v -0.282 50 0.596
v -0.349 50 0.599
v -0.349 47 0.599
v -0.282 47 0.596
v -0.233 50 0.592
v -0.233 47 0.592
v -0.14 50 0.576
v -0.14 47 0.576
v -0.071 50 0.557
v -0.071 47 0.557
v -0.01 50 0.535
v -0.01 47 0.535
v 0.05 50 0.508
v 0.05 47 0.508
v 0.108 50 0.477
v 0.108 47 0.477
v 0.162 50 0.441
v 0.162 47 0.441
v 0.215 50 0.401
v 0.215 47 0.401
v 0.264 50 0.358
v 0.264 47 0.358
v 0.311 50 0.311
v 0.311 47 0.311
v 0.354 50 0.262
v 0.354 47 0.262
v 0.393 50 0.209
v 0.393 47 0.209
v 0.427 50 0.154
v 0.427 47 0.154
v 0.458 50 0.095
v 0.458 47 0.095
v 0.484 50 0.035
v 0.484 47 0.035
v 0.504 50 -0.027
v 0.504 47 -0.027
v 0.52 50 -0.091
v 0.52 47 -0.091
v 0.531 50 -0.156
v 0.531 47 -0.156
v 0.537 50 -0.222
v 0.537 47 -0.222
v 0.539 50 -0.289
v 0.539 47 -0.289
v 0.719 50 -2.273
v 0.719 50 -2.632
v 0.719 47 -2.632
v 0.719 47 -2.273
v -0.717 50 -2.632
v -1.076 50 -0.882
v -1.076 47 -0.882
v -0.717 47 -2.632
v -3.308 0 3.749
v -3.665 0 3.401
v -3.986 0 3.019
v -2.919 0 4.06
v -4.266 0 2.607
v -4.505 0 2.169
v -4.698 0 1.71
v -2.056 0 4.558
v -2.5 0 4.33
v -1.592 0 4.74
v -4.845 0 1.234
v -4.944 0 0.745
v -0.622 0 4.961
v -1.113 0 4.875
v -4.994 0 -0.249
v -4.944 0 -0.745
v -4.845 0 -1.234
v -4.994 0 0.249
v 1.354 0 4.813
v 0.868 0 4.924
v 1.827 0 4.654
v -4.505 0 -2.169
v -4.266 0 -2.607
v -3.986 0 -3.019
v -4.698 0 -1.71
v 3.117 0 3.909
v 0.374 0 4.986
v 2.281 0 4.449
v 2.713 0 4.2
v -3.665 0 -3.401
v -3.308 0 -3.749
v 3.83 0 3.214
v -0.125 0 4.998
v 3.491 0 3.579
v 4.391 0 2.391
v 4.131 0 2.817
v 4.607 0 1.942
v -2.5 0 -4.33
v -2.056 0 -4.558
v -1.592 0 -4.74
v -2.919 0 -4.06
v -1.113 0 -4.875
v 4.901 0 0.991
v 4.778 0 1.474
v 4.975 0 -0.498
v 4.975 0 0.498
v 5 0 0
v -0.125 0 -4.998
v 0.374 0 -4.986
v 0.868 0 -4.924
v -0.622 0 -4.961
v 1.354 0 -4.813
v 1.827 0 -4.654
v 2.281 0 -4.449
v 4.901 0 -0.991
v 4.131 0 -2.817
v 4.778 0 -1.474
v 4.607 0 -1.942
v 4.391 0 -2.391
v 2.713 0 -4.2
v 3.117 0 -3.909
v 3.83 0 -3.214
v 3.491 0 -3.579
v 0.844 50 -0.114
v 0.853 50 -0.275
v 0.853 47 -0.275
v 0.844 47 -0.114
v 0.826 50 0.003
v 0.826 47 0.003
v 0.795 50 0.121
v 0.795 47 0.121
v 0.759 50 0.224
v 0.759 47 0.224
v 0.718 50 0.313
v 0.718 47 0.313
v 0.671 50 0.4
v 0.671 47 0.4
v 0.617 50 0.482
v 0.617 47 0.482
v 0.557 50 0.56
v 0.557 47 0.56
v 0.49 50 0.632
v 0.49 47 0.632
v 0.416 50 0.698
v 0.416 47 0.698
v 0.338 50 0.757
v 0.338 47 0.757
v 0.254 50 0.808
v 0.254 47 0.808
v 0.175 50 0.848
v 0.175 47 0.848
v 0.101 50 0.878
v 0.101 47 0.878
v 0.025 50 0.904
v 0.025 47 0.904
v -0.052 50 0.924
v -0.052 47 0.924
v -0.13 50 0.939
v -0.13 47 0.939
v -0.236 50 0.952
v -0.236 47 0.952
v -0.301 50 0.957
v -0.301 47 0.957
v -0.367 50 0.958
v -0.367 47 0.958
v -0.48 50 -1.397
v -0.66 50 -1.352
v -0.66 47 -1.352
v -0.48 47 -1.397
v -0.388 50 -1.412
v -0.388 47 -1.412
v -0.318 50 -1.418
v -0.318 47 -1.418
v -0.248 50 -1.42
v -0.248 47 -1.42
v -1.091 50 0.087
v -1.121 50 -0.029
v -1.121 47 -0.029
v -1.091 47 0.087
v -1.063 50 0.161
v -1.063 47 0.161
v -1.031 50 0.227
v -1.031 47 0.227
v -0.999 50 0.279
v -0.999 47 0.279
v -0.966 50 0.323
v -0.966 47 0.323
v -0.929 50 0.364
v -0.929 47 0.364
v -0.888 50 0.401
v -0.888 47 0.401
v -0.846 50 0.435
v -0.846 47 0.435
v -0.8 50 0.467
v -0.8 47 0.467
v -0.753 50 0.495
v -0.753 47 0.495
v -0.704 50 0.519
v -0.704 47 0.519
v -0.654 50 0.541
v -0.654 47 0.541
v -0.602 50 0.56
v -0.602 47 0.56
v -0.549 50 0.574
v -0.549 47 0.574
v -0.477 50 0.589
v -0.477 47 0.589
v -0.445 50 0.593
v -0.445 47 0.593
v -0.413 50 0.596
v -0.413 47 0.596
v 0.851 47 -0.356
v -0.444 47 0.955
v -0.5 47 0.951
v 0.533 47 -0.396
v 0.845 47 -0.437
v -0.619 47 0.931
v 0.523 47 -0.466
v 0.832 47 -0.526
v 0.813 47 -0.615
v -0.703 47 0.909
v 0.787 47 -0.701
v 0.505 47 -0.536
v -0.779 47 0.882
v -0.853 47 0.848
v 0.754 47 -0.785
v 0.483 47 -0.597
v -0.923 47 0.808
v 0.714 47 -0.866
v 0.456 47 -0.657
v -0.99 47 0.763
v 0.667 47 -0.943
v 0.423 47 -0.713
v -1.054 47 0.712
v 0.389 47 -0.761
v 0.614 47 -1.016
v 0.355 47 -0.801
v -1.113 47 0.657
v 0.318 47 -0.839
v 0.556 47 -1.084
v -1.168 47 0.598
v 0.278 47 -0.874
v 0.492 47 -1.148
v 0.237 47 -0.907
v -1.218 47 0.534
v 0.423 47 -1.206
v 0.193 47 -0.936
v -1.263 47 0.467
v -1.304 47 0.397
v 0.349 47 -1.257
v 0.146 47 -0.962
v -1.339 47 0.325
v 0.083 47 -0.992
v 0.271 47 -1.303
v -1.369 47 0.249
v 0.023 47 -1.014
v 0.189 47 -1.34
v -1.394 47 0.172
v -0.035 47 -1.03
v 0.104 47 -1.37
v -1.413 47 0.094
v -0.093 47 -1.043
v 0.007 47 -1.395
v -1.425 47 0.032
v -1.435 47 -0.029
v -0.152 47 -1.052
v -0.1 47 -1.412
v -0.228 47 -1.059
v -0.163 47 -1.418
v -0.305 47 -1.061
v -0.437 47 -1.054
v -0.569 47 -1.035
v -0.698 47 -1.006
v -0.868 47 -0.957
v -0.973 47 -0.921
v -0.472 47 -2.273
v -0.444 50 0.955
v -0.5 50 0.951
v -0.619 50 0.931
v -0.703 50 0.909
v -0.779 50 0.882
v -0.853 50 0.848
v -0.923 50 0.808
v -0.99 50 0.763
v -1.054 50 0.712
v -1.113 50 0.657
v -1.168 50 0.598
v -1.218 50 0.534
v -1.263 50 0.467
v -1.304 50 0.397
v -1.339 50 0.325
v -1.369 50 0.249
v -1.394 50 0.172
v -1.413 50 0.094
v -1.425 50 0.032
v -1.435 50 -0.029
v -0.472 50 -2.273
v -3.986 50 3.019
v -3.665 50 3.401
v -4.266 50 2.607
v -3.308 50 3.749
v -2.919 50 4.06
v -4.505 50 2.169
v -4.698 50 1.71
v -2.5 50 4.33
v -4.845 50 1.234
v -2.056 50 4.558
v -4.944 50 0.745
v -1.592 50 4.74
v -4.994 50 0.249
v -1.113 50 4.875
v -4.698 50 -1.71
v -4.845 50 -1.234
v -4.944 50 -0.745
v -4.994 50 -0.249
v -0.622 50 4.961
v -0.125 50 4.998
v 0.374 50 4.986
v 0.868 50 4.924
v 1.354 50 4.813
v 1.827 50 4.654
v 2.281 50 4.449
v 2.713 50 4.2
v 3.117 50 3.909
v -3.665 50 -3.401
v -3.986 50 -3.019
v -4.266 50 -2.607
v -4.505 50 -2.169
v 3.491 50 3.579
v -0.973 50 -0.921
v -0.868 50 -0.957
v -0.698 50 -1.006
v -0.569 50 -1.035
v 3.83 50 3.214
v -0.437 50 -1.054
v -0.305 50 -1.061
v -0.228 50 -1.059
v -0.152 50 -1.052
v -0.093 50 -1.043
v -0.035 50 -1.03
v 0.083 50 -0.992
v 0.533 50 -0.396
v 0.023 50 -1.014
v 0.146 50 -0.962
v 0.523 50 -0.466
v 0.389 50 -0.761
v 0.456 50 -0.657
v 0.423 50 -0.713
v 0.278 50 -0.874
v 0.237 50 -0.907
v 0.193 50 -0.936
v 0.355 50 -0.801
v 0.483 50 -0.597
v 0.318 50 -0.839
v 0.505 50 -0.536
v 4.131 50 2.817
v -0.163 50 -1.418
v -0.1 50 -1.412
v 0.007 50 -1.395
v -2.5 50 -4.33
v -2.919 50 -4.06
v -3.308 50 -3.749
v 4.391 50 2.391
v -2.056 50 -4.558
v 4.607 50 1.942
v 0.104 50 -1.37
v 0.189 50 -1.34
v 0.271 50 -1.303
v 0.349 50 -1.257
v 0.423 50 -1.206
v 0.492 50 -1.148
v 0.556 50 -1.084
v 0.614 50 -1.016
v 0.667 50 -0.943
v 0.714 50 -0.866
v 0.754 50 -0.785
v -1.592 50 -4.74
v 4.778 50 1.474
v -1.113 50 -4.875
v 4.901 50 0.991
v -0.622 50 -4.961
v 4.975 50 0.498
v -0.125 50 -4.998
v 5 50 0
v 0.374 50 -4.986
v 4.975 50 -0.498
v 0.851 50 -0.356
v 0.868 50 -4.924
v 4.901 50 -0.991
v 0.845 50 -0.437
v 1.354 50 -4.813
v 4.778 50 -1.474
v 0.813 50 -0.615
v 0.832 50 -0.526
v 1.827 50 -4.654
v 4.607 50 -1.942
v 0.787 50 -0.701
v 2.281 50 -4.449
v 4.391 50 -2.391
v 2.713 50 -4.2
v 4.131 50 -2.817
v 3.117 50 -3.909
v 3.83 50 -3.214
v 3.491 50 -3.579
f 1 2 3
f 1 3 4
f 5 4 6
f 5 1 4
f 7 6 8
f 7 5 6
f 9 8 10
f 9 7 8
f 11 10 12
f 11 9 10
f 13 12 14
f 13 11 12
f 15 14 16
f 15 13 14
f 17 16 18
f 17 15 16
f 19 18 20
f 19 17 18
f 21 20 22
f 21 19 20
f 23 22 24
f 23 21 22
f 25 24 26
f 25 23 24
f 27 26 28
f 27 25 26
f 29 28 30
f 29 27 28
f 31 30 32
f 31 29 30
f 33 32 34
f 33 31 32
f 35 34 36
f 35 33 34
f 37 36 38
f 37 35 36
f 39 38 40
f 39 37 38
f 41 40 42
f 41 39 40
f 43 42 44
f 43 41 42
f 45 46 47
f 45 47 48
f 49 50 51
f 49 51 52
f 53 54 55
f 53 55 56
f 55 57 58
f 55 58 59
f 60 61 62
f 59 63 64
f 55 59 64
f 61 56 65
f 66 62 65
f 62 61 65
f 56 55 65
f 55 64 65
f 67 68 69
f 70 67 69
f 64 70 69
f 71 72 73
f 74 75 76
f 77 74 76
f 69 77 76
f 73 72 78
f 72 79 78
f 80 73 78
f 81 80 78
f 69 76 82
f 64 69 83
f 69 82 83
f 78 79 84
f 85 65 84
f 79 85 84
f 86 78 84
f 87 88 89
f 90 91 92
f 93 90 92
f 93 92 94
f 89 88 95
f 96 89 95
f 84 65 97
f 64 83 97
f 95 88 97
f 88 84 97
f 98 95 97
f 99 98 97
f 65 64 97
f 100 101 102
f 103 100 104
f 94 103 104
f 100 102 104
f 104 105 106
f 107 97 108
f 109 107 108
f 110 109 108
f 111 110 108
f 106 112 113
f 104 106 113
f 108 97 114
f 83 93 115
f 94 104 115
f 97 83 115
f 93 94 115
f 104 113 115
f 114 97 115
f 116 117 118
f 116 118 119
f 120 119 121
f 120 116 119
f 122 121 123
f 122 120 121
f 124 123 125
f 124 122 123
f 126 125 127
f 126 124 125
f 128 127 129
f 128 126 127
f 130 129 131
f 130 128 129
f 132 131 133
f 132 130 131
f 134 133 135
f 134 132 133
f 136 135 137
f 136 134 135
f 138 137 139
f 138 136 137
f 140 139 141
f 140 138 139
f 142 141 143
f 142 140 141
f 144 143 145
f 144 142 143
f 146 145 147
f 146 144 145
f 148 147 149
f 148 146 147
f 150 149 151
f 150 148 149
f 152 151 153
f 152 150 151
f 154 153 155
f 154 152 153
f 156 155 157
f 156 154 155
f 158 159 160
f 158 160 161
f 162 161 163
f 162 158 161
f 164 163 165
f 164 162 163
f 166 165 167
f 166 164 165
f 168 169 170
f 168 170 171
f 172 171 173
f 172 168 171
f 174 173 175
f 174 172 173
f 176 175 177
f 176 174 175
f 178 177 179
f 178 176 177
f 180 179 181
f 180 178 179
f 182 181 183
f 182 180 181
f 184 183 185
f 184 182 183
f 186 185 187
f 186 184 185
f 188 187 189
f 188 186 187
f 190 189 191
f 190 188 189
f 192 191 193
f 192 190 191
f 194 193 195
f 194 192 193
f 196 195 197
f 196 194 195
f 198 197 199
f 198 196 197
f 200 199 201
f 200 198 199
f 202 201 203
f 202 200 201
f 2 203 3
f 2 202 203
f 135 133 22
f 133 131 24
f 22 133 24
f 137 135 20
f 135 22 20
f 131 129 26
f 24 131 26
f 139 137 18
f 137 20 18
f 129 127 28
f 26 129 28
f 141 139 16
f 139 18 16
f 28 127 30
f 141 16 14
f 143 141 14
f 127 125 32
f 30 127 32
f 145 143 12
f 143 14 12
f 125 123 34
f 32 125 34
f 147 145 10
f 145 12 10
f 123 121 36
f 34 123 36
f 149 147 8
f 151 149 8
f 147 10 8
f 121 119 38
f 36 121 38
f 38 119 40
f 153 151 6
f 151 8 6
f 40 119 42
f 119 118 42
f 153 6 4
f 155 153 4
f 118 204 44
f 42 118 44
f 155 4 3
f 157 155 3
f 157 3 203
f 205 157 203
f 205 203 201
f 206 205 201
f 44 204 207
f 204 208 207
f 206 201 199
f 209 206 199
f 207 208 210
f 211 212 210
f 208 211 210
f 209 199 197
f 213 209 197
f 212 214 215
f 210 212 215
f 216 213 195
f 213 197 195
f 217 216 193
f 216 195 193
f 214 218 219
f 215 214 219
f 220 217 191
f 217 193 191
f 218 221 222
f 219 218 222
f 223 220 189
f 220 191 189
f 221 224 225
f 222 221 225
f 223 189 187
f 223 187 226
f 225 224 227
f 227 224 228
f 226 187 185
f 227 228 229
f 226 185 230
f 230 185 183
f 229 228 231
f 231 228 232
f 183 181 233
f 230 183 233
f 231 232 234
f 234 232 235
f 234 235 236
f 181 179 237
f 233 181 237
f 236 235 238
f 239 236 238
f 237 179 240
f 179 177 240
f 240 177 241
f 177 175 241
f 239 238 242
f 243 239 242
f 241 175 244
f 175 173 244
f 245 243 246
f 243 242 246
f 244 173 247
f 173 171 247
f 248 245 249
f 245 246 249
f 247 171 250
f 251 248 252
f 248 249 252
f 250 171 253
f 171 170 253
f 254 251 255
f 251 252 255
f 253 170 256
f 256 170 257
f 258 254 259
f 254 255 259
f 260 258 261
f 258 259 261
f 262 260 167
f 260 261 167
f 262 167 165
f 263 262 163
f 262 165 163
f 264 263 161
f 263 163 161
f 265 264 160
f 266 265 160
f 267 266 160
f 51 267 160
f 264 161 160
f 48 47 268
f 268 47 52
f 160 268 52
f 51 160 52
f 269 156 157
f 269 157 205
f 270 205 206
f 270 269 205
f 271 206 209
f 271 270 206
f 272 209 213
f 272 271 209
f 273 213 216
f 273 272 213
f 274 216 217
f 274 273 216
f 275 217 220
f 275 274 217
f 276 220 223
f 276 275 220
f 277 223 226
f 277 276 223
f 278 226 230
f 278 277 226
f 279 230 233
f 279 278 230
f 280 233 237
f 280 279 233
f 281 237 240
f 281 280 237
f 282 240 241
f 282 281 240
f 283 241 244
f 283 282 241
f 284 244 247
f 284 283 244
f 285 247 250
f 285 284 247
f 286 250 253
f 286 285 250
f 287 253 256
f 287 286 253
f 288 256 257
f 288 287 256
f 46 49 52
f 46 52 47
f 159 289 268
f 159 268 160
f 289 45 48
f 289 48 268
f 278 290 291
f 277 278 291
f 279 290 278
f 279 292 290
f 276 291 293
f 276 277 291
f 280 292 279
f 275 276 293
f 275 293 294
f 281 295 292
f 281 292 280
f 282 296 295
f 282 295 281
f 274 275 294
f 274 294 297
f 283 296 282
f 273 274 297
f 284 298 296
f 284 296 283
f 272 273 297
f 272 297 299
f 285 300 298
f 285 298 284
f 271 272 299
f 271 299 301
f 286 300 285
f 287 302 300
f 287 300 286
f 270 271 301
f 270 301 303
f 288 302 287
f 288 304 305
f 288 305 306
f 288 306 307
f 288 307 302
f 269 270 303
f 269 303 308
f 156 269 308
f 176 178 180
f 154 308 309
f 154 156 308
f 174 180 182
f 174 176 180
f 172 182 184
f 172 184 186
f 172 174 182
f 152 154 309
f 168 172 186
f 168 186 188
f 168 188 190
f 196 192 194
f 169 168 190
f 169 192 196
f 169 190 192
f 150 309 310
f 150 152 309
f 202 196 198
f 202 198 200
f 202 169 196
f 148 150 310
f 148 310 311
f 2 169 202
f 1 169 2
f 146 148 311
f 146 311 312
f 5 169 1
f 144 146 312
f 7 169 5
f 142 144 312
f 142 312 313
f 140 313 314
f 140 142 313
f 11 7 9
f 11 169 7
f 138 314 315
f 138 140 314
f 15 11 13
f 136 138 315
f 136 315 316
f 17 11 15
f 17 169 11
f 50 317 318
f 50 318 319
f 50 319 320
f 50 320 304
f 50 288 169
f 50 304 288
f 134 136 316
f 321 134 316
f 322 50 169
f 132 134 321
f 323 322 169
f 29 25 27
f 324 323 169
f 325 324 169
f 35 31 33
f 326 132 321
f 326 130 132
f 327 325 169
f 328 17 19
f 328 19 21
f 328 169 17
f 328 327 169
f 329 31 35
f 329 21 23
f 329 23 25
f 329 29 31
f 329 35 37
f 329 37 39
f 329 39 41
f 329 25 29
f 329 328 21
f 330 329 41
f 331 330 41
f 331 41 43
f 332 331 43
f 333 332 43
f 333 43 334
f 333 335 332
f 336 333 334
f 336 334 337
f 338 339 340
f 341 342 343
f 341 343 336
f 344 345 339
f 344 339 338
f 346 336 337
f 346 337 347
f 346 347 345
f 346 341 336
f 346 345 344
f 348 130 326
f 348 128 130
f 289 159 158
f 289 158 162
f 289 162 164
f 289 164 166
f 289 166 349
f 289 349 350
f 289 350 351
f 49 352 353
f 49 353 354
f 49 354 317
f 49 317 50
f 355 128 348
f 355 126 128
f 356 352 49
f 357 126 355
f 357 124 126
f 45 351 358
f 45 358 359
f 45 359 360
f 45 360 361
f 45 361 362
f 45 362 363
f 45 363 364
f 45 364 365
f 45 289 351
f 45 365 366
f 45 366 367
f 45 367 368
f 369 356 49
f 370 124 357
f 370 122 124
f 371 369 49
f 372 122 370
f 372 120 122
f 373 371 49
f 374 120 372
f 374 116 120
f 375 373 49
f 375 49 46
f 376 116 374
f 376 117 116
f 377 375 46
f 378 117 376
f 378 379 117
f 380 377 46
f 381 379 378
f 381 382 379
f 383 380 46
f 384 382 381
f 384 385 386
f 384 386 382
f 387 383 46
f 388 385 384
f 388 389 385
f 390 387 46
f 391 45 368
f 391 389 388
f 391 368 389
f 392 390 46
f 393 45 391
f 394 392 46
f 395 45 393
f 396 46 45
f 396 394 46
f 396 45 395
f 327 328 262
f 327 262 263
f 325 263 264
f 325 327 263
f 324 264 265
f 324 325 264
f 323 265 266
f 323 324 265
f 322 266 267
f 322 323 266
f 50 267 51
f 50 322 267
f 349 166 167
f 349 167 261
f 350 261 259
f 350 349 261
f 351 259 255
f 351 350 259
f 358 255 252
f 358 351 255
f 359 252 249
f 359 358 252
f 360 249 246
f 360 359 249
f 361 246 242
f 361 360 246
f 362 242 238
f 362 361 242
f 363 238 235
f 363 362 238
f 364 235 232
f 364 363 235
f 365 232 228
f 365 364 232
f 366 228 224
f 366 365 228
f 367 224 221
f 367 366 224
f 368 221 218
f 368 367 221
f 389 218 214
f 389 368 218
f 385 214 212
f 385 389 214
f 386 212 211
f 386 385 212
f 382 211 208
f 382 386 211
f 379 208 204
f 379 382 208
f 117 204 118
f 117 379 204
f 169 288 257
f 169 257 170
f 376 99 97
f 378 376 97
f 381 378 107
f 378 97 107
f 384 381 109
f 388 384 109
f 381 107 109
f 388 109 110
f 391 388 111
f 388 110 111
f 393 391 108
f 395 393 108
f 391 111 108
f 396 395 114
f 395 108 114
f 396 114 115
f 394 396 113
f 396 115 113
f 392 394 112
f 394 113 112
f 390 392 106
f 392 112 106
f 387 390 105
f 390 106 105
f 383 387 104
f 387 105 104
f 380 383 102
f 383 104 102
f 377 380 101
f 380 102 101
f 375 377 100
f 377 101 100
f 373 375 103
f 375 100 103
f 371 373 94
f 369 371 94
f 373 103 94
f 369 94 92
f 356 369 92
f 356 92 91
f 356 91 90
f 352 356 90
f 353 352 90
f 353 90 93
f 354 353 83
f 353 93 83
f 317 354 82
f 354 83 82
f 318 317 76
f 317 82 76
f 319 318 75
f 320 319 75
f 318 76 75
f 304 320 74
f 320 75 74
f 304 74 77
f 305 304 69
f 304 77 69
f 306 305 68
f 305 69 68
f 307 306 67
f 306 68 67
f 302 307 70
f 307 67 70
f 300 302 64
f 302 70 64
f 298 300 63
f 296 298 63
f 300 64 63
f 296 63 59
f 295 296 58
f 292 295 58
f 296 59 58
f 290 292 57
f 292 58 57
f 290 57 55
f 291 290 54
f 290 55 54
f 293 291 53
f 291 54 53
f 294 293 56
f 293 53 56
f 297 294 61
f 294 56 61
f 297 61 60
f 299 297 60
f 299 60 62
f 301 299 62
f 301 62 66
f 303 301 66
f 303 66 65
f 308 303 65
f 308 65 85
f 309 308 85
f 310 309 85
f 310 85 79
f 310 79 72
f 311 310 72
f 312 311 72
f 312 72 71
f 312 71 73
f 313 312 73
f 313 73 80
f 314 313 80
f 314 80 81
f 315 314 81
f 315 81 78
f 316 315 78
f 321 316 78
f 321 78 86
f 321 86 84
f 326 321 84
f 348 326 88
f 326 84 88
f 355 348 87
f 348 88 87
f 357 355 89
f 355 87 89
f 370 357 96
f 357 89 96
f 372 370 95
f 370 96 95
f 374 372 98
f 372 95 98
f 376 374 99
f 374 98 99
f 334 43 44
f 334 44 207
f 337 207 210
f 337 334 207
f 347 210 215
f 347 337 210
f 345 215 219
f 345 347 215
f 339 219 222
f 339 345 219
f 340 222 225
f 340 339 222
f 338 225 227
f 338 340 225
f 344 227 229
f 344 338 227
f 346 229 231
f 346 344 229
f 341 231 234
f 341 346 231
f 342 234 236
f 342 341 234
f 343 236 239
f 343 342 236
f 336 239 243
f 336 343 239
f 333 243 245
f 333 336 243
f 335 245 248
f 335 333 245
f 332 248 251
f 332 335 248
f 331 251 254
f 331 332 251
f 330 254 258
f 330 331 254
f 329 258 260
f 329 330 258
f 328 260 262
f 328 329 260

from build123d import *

# Parameters (mm, degrees)
SKETCH1_R           = 5
BOSS_EXTRUDE1_DEPTH = 50
CUT_EXTRUDE1_DEPTH  = 3


with BuildPart() as part:
    # Sketch1 → Boss-Extrude1 (new body)
    with BuildSketch(Plane(origin=(0, 0, 0), x_dir=(1, 0, 0), z_dir=(0, 1, 0))):
        Circle(SKETCH1_R)
    extrude(amount=BOSS_EXTRUDE1_DEPTH)

    # Sketch2 → Cut-Extrude1 (cut)
    with BuildSketch(Plane(origin=(0, 50, 0), x_dir=(1, 0, 0), z_dir=(0, 1, 0))):
        with BuildLine():
            Line((0.718635203, 2.631935528), (0.718635203, 2.272961169))
            Line((0.718635203, 2.272961169), (-0.471869605, 2.272961169))
            Line((-0.471869605, 2.272961169), (-0.660471368, 1.352388253))
            add(Edge.make_bspline(
                [(-0.660471368, 1.352388253), (-0.623415494, 1.362618525), (-0.551625598, 1.382438058), (-0.445665737, 1.404443829), (-0.345073533, 1.417709273), (-0.279798163, 1.419520583), (-0.248211753, 1.420397067)],
                knots=[0, 0, 0, 0, 0.000115302, 0.000223379, 0.000324431, 0.000419176, 0.000419176, 0.000419176, 0.000419176], degree=3))
            add(Edge.make_bspline(
                [(-0.248211753, 1.420397067), (-0.209128013, 1.419551131), (-0.132279616, 1.41788781), (-0.019840669, 1.401915961), (0.087492225, 1.376776046), (0.189494595, 1.341655524), (0.286355146, 1.296745791), (0.377182707, 1.240645851), (0.46334062, 1.17511252), (0.543283214, 1.099767508), (0.615807522, 1.016845891), (0.679573512, 0.92768802), (0.733736102, 0.833160358), (0.777296857, 0.732359749), (0.812081191, 0.626400596), (0.835233186, 0.514168013), (0.850649895, 0.396719893), (0.852372281, 0.316415323), (0.853250587, 0.275465176)],
                knots=[0, 0, 0, 0, 0.00011719, 0.000230425, 0.000339944, 0.000447481, 0.000553499, 0.000659556, 0.000767111, 0.000877722, 0.000988528, 0.001097091, 0.001206056, 0.001314692, 0.001425996, 0.001539995, 0.001658004, 0.001780798, 0.001780798, 0.001780798, 0.001780798], degree=3))
            add(Edge.make_bspline(
                [(0.853250587, 0.275465176), (0.852585512, 0.246942956), (0.851264349, 0.190283968), (0.844545762, 0.106139767), (0.831610046, 0.023776934), (0.814242321, -0.056815458), (0.791699904, -0.13548483), (0.76441085, -0.212456358), (0.731014822, -0.287250965), (0.694383447, -0.36057636), (0.653136969, -0.430774867), (0.607358461, -0.496423853), (0.55899297, -0.558508135), (0.506951585, -0.616361868), (0.45075059, -0.669604886), (0.391070623, -0.718553167), (0.328387904, -0.764034497), (0.261732661, -0.804202693), (0.192590179, -0.841165649), (0.119961961, -0.871489186), (0.045501261, -0.898599714), (-0.031863615, -0.920209242), (-0.111957427, -0.937141796), (-0.194912203, -0.948642397), (-0.280292873, -0.957018834), (-0.338167885, -0.957543191), (-0.367402458, -0.957808061)],
                knots=[0, 0, 0, 0, 8.5583e-05, 0.000170009, 0.000253005, 0.000335518, 0.000417186, 0.000498352, 0.000580291, 0.000662755, 0.000744161, 0.000824288, 0.000902692, 0.000980133, 0.001057498, 0.001134702, 0.00121156, 0.001289599, 0.001368002, 0.001446531, 0.001525481, 0.001605609, 0.001687289, 0.001770875, 0.001856759, 0.001944425, 0.001944425, 0.001944425, 0.001944425], degree=3))
            add(Edge.make_bspline(
                [(-0.367402458, -0.957808061), (-0.402276638, -0.957117223), (-0.470887469, -0.955758081), (-0.571408036, -0.941539596), (-0.668122642, -0.92117568), (-0.760252743, -0.89053941), (-0.848624007, -0.852152115), (-0.932046724, -0.803635944), (-1.012652501, -0.74865684), (-1.087164537, -0.683776487), (-1.156320651, -0.612860805), (-1.21822716, -0.535903164), (-1.273360736, -0.454173722), (-1.320838483, -0.367275567), (-1.361336505, -0.275437037), (-1.393151493, -0.178314036), (-1.418829848, -0.076414032), (-1.429693268, -0.006260521), (-1.435210951, 0.029371426)],
                knots=[0, 0, 0, 0, 0.000104552, 0.000205693, 0.000304023, 0.000400691, 0.00049644, 0.000592535, 0.000689779, 0.000788716, 0.000888377, 0.000986596, 0.001084603, 0.001183757, 0.001283279, 0.001385267, 0.001490017, 0.001598135, 0.001598135, 0.001598135, 0.001598135], degree=3))
            Line((-1.435210951, 0.029371426), (-1.121108387, 0.029371426))
            add(Edge.make_bspline(
                [(-1.121108387, 0.029371426), (-1.11337983, -0.004005027), (-1.098525113, -0.068156421), (-1.065919365, -0.158287763), (-1.026053489, -0.238606986), (-0.978649141, -0.31017657), (-0.92209911, -0.372585567), (-0.857569681, -0.428202629), (-0.785221958, -0.478377758), (-0.704828729, -0.520200525), (-0.620015649, -0.555869279), (-0.531248439, -0.579620974), (-0.440944093, -0.596321867), (-0.379865723, -0.597993627), (-0.349173291, -0.598833702)],
                knots=[0, 0, 0, 0, 0.000102709, 0.000197412, 0.000286774, 0.000371169, 0.000454082, 0.000538572, 0.000626283, 0.000717552, 0.000809994, 0.00090168, 0.00099274, 0.001084718, 0.001084718, 0.001084718, 0.001084718], degree=3))
            add(Edge.make_bspline(
                [(-0.349173291, -0.598833702), (-0.319214847, -0.598012924), (-0.260226424, -0.596396806), (-0.173415038, -0.583957794), (-0.089602164, -0.564800223), (-0.009614807, -0.536130368), (0.067946733, -0.501285649), (0.141120503, -0.456570573), (0.21202338, -0.405110555), (0.278451514, -0.346153925), (0.339290963, -0.28118423), (0.393047084, -0.211706837), (0.437823998, -0.13758999), (0.475558107, -0.060116837), (0.504211405, 0.02156172), (0.524652387, 0.107062895), (0.536655445, 0.196597875), (0.538306625, 0.257667185), (0.539148023, 0.28878649)],
                knots=[0, 0, 0, 0, 8.9842e-05, 0.0001769, 0.000262612, 0.000347317, 0.000431396, 0.000517249, 0.000604055, 0.000693954, 0.000783242, 0.000870748, 0.000956963, 0.001042571, 0.001128832, 0.00121607, 0.001305907, 0.001399251, 0.001399251, 0.001399251, 0.001399251], degree=3))
            add(Edge.make_bspline(
                [(0.539148023, 0.28878649), (0.538489544, 0.316862242), (0.537200664, 0.371816531), (0.526670093, 0.452215737), (0.508353121, 0.528288779), (0.482929241, 0.600403013), (0.450649733, 0.668626456), (0.411203421, 0.733029516), (0.363850023, 0.792763349), (0.309758135, 0.847855903), (0.250500094, 0.898700778), (0.185056351, 0.942044864), (0.114796424, 0.978508782), (0.040566825, 1.00997678), (-0.039398074, 1.032577525), (-0.123514706, 1.049545411), (-0.212691414, 1.059360774), (-0.273662102, 1.060722662), (-0.305002618, 1.061422708)],
                knots=[0, 0, 0, 0, 8.4208e-05, 0.000164824, 0.000242709, 0.000318547, 0.000393815, 0.000468731, 0.000544614, 0.00062196, 0.000700062, 0.000778428, 0.000856831, 0.000937299, 0.001019835, 0.001105635, 0.00119452, 0.001288536, 0.001288536, 0.001288536, 0.001288536], degree=3))
            add(Edge.make_bspline(
                [(-0.305002618, 1.061422708), (-0.332131547, 1.060842117), (-0.388145902, 1.059643343), (-0.474068729, 1.050816846), (-0.564360452, 1.036577552), (-0.658674947, 1.016991305), (-0.757295455, 0.991360228), (-0.860013856, 0.960645727), (-0.967046123, 0.923923728), (-1.039163847, 0.896191515), (-1.076236592, 0.881935528)],
                knots=[0, 0, 0, 0, 8.1378e-05, 0.000168026, 0.000258858, 0.000355524, 0.000456875, 0.000564457, 0.000677092, 0.000796243, 0.000796243, 0.000796243, 0.000796243], degree=3))
            Line((-1.076236592, 0.881935528), (-0.717262233, 2.631935528))
            Line((-0.717262233, 2.631935528), (0.718635203, 2.631935528))
        make_face()
    extrude(amount=-CUT_EXTRUDE1_DEPTH, mode=Mode.SUBTRACT)


solid = part.part
